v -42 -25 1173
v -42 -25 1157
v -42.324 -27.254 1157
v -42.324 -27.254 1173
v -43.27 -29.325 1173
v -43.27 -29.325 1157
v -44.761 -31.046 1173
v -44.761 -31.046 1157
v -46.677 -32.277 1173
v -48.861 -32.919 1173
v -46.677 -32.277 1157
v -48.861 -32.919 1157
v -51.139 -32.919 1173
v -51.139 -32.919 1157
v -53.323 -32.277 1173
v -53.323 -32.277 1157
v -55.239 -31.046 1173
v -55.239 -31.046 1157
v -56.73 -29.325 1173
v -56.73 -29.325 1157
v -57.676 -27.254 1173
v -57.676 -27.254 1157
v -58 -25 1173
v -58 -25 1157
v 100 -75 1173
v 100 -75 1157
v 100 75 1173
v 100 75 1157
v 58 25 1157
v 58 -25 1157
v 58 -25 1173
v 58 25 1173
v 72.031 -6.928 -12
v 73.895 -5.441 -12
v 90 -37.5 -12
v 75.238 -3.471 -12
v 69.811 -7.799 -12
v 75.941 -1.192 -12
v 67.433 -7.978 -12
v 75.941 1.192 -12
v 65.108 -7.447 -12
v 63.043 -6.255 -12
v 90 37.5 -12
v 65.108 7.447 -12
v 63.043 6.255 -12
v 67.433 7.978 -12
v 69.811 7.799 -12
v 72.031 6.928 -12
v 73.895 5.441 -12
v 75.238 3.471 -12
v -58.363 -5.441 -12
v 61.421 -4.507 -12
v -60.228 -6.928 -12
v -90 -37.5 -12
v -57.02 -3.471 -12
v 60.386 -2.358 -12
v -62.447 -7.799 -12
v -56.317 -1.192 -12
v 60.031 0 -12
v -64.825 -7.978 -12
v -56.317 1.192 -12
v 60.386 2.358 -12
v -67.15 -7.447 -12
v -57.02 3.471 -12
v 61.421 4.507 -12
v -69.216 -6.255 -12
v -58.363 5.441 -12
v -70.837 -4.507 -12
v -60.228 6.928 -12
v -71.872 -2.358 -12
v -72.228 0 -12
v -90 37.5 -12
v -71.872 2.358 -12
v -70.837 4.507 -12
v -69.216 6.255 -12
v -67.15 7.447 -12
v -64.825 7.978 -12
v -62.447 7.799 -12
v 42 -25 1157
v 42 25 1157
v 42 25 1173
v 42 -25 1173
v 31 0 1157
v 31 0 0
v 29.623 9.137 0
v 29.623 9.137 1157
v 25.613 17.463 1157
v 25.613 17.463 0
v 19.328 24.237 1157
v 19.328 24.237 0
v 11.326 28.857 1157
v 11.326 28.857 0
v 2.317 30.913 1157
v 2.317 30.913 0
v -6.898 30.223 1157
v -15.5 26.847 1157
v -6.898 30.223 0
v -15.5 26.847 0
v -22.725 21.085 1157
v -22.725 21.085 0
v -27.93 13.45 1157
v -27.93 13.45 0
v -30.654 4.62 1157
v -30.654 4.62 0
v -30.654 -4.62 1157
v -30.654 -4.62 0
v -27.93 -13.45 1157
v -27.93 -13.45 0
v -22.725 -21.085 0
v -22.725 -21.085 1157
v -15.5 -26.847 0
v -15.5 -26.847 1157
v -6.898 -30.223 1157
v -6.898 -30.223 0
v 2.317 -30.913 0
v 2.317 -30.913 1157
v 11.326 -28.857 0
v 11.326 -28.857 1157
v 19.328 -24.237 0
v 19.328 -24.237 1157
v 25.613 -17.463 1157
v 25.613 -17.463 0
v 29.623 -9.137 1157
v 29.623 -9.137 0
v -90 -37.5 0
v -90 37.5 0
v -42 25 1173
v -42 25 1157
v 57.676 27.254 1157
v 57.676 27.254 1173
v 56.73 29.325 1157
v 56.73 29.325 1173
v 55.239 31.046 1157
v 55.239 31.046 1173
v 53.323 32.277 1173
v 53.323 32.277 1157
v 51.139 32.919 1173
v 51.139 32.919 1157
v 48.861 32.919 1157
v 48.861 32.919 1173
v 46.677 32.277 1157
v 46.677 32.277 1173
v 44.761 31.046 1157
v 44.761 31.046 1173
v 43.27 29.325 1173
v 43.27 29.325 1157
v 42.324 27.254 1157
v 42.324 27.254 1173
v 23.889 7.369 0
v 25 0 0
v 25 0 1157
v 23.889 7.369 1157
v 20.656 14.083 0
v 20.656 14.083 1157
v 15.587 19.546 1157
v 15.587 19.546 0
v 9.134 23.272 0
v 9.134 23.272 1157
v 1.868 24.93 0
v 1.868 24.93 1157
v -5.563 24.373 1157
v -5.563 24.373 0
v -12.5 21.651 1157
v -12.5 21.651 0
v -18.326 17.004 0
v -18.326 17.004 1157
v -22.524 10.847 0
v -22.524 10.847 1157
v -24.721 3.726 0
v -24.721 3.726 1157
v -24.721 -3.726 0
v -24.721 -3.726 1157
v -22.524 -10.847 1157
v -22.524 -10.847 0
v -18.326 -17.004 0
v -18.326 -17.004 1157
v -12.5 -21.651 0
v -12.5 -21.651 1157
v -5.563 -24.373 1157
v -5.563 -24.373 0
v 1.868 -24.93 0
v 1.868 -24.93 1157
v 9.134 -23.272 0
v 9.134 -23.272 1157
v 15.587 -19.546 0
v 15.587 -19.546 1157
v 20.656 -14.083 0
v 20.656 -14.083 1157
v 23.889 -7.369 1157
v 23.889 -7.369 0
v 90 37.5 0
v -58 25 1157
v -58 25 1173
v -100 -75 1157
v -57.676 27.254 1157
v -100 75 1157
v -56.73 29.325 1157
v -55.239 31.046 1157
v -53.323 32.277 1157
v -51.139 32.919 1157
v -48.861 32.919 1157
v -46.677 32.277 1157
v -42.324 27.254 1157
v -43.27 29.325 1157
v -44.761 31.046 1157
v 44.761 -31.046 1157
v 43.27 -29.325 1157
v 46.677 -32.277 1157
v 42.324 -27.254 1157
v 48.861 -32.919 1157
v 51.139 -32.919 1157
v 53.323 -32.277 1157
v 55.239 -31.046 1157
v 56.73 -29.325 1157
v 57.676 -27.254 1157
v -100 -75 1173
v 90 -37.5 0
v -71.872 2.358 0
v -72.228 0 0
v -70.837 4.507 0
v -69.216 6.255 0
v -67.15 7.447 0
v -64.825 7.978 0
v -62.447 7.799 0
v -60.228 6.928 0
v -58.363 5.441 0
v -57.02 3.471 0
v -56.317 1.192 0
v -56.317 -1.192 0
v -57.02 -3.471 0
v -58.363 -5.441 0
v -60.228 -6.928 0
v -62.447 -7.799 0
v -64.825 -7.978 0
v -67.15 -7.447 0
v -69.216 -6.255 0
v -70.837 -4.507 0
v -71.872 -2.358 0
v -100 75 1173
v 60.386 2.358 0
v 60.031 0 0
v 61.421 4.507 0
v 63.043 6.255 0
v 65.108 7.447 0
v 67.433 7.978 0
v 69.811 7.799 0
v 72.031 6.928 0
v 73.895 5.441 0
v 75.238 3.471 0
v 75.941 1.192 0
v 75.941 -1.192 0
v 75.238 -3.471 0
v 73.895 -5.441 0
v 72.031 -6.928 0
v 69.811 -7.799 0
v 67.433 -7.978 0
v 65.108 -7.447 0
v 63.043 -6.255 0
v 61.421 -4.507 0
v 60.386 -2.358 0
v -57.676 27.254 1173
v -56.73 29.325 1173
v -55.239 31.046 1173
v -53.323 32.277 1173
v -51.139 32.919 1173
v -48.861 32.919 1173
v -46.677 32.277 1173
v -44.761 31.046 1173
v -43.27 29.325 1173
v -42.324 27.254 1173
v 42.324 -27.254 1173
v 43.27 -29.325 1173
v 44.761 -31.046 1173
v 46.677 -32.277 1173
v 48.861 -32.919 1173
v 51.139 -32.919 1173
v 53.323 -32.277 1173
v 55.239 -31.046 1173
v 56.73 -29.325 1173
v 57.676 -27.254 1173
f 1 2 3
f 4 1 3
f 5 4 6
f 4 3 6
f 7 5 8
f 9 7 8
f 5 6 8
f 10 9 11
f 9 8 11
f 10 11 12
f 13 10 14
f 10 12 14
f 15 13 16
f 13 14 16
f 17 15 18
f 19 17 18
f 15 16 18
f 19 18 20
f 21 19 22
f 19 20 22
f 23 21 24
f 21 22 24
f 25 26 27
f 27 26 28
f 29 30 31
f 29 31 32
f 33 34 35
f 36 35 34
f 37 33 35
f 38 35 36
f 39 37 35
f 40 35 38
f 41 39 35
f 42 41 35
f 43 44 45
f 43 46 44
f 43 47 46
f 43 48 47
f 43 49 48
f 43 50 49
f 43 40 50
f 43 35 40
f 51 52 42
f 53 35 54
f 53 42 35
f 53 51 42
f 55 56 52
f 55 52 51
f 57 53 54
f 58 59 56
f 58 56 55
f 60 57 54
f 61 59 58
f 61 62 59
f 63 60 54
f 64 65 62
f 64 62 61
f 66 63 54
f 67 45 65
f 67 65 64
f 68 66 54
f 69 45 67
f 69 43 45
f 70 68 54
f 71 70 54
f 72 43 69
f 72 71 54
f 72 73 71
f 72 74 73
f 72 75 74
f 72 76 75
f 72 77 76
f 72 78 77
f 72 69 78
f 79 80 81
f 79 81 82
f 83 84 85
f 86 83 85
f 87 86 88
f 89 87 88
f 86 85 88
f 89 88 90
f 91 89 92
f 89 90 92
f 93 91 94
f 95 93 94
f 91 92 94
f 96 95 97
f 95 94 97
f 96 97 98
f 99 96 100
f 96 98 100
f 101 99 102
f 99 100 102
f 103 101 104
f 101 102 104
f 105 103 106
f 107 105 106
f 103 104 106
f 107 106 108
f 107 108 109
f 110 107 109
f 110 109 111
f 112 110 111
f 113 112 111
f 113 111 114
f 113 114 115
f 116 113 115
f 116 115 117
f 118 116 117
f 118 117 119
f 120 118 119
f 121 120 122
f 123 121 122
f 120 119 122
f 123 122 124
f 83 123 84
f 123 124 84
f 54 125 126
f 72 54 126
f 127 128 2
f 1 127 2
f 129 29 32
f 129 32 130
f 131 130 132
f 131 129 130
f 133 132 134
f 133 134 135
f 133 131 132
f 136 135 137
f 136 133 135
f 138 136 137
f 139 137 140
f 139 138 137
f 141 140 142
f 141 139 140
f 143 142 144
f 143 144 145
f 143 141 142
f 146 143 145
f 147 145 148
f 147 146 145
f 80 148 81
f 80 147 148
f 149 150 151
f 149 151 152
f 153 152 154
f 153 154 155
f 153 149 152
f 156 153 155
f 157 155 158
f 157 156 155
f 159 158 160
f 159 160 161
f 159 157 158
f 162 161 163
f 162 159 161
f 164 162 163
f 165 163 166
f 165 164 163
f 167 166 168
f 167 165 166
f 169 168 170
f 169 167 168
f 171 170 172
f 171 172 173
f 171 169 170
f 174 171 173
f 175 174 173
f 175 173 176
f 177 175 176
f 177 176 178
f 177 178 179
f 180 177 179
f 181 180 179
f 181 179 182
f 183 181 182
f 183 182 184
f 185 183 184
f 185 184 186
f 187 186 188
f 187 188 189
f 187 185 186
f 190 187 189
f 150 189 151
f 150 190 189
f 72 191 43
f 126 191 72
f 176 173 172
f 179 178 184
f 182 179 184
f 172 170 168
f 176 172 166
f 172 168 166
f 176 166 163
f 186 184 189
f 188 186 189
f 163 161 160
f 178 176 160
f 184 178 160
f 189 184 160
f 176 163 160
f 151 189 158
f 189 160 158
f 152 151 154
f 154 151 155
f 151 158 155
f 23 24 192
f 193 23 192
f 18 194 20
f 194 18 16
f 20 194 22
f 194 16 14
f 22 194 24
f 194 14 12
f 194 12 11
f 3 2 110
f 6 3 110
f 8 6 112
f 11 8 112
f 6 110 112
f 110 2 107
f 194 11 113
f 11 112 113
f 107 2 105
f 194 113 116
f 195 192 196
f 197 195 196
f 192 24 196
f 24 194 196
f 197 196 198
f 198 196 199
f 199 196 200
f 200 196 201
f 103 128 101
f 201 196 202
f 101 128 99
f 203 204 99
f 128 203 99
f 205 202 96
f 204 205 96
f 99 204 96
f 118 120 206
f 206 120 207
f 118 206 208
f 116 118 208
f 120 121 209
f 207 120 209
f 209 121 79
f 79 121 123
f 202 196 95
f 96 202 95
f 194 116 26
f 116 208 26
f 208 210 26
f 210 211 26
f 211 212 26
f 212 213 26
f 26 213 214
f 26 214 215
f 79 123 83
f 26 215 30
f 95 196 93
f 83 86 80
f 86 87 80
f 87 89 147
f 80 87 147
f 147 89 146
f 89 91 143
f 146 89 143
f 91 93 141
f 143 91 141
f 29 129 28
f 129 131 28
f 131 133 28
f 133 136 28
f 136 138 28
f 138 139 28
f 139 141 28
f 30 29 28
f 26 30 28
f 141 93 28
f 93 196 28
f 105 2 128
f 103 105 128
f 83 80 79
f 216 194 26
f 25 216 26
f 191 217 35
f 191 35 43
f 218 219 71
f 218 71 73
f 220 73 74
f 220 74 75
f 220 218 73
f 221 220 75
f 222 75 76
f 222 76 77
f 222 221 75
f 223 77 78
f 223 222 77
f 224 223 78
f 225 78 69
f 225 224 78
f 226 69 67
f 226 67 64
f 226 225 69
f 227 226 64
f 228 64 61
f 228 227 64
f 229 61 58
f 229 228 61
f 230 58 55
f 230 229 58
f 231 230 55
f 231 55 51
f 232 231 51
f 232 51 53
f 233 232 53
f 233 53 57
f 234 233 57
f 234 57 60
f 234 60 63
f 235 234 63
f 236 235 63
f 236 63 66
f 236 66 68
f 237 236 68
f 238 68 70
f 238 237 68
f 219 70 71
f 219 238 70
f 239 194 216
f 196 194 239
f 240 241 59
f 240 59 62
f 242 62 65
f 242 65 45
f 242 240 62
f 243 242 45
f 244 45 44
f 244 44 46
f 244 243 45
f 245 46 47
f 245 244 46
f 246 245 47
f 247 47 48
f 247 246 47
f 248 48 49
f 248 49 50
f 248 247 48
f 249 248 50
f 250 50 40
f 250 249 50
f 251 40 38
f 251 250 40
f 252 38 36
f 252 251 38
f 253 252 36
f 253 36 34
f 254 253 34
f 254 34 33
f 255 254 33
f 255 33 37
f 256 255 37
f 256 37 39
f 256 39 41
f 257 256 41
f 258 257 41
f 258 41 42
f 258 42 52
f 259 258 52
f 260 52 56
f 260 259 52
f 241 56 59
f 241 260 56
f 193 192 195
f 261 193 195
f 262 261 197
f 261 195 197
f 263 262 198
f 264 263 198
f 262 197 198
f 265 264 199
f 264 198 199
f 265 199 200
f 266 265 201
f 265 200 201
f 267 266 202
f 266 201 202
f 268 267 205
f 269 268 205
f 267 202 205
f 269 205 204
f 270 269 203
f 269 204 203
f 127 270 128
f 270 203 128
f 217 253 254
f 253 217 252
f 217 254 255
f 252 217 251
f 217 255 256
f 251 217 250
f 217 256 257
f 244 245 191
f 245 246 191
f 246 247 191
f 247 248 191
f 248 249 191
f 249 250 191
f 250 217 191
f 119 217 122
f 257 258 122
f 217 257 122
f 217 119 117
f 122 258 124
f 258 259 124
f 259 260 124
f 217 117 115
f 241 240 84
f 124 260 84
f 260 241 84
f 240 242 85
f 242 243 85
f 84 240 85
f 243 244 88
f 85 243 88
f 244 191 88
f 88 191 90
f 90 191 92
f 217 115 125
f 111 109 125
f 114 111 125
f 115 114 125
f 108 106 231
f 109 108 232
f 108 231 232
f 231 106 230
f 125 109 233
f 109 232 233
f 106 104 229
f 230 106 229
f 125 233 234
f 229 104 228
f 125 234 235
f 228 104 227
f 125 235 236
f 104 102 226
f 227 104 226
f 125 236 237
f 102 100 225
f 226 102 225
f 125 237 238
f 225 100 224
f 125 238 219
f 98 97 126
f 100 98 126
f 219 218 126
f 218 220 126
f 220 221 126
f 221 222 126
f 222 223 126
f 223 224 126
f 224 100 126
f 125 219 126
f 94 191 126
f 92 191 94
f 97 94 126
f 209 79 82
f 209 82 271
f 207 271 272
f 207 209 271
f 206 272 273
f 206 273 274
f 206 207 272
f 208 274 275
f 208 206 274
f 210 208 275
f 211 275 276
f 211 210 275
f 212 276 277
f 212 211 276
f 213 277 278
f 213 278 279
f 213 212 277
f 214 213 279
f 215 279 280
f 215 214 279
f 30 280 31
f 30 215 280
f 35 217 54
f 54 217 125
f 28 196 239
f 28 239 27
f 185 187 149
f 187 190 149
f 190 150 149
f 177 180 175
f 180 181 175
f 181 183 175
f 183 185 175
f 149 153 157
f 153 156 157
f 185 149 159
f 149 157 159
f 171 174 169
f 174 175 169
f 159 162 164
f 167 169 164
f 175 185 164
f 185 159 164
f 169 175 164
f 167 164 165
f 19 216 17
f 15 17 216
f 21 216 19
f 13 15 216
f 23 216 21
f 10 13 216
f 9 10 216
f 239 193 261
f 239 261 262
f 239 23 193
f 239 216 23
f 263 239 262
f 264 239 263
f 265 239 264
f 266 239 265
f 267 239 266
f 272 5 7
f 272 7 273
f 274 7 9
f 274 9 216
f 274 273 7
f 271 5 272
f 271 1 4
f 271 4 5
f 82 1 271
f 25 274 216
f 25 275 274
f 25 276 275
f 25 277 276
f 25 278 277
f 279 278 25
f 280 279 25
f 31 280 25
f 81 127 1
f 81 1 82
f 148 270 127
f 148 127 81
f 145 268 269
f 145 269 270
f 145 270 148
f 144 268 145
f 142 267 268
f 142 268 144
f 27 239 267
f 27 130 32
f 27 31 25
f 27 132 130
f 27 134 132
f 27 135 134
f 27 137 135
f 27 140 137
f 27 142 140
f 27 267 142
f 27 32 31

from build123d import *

# Parameters (mm, degrees)
SKETCH1_R           = 31
SKETCH1_R_2         = 25
BOSS_EXTRUDE1_DEPTH = 1157
SKETCH2_W           = 180
SKETCH2_H           = 75
SKETCH2_R           = 8
BOSS_EXTRUDE2_DEPTH = 12
SKETCH3_W           = 200
SKETCH3_H           = 150
BOSS_EXTRUDE3_DEPTH = 16


with BuildPart() as part:
    # Sketch1 → Boss-Extrude1 (new body)
    with BuildSketch(Plane.XY):
        Circle(SKETCH1_R)
        Circle(SKETCH1_R_2, mode=Mode.SUBTRACT)
    extrude(amount=BOSS_EXTRUDE1_DEPTH)

    # Sketch2 → Boss-Extrude2 (add)
    with BuildSketch(Plane(origin=(0, 0, 0), x_dir=(-1, 0, 0), z_dir=(0, 0, -1))):
        Rectangle(SKETCH2_W, SKETCH2_H)
        with Locations((64.227589169, 0)):
            Circle(SKETCH2_R, mode=Mode.SUBTRACT)
        with Locations((-68.030538528, 0)):
            Circle(SKETCH2_R, mode=Mode.SUBTRACT)
    extrude(amount=BOSS_EXTRUDE2_DEPTH)

    # Sketch3 → Boss-Extrude3 (add)
    with BuildSketch(Plane.XY.offset(1157)):
        Rectangle(SKETCH3_W, SKETCH3_H)
        with BuildLine():
            Line((-42, 25), (-42, -25))
            ThreePointArc((-42, -25), (-50, -33), (-58, -25))
            Line((-58, -25), (-58, 25))
            ThreePointArc((-58, 25), (-50, 33), (-42, 25))
        make_face(mode=Mode.SUBTRACT)
        with BuildLine():
            Line((42, 25), (42, -25))
            ThreePointArc((42, -25), (50, -33), (58, -25))
            Line((58, -25), (58, 25))
            ThreePointArc((58, 25), (50, 33), (42, 25))
        make_face(mode=Mode.SUBTRACT)
    extrude(amount=BOSS_EXTRUDE3_DEPTH)


solid = part.part
